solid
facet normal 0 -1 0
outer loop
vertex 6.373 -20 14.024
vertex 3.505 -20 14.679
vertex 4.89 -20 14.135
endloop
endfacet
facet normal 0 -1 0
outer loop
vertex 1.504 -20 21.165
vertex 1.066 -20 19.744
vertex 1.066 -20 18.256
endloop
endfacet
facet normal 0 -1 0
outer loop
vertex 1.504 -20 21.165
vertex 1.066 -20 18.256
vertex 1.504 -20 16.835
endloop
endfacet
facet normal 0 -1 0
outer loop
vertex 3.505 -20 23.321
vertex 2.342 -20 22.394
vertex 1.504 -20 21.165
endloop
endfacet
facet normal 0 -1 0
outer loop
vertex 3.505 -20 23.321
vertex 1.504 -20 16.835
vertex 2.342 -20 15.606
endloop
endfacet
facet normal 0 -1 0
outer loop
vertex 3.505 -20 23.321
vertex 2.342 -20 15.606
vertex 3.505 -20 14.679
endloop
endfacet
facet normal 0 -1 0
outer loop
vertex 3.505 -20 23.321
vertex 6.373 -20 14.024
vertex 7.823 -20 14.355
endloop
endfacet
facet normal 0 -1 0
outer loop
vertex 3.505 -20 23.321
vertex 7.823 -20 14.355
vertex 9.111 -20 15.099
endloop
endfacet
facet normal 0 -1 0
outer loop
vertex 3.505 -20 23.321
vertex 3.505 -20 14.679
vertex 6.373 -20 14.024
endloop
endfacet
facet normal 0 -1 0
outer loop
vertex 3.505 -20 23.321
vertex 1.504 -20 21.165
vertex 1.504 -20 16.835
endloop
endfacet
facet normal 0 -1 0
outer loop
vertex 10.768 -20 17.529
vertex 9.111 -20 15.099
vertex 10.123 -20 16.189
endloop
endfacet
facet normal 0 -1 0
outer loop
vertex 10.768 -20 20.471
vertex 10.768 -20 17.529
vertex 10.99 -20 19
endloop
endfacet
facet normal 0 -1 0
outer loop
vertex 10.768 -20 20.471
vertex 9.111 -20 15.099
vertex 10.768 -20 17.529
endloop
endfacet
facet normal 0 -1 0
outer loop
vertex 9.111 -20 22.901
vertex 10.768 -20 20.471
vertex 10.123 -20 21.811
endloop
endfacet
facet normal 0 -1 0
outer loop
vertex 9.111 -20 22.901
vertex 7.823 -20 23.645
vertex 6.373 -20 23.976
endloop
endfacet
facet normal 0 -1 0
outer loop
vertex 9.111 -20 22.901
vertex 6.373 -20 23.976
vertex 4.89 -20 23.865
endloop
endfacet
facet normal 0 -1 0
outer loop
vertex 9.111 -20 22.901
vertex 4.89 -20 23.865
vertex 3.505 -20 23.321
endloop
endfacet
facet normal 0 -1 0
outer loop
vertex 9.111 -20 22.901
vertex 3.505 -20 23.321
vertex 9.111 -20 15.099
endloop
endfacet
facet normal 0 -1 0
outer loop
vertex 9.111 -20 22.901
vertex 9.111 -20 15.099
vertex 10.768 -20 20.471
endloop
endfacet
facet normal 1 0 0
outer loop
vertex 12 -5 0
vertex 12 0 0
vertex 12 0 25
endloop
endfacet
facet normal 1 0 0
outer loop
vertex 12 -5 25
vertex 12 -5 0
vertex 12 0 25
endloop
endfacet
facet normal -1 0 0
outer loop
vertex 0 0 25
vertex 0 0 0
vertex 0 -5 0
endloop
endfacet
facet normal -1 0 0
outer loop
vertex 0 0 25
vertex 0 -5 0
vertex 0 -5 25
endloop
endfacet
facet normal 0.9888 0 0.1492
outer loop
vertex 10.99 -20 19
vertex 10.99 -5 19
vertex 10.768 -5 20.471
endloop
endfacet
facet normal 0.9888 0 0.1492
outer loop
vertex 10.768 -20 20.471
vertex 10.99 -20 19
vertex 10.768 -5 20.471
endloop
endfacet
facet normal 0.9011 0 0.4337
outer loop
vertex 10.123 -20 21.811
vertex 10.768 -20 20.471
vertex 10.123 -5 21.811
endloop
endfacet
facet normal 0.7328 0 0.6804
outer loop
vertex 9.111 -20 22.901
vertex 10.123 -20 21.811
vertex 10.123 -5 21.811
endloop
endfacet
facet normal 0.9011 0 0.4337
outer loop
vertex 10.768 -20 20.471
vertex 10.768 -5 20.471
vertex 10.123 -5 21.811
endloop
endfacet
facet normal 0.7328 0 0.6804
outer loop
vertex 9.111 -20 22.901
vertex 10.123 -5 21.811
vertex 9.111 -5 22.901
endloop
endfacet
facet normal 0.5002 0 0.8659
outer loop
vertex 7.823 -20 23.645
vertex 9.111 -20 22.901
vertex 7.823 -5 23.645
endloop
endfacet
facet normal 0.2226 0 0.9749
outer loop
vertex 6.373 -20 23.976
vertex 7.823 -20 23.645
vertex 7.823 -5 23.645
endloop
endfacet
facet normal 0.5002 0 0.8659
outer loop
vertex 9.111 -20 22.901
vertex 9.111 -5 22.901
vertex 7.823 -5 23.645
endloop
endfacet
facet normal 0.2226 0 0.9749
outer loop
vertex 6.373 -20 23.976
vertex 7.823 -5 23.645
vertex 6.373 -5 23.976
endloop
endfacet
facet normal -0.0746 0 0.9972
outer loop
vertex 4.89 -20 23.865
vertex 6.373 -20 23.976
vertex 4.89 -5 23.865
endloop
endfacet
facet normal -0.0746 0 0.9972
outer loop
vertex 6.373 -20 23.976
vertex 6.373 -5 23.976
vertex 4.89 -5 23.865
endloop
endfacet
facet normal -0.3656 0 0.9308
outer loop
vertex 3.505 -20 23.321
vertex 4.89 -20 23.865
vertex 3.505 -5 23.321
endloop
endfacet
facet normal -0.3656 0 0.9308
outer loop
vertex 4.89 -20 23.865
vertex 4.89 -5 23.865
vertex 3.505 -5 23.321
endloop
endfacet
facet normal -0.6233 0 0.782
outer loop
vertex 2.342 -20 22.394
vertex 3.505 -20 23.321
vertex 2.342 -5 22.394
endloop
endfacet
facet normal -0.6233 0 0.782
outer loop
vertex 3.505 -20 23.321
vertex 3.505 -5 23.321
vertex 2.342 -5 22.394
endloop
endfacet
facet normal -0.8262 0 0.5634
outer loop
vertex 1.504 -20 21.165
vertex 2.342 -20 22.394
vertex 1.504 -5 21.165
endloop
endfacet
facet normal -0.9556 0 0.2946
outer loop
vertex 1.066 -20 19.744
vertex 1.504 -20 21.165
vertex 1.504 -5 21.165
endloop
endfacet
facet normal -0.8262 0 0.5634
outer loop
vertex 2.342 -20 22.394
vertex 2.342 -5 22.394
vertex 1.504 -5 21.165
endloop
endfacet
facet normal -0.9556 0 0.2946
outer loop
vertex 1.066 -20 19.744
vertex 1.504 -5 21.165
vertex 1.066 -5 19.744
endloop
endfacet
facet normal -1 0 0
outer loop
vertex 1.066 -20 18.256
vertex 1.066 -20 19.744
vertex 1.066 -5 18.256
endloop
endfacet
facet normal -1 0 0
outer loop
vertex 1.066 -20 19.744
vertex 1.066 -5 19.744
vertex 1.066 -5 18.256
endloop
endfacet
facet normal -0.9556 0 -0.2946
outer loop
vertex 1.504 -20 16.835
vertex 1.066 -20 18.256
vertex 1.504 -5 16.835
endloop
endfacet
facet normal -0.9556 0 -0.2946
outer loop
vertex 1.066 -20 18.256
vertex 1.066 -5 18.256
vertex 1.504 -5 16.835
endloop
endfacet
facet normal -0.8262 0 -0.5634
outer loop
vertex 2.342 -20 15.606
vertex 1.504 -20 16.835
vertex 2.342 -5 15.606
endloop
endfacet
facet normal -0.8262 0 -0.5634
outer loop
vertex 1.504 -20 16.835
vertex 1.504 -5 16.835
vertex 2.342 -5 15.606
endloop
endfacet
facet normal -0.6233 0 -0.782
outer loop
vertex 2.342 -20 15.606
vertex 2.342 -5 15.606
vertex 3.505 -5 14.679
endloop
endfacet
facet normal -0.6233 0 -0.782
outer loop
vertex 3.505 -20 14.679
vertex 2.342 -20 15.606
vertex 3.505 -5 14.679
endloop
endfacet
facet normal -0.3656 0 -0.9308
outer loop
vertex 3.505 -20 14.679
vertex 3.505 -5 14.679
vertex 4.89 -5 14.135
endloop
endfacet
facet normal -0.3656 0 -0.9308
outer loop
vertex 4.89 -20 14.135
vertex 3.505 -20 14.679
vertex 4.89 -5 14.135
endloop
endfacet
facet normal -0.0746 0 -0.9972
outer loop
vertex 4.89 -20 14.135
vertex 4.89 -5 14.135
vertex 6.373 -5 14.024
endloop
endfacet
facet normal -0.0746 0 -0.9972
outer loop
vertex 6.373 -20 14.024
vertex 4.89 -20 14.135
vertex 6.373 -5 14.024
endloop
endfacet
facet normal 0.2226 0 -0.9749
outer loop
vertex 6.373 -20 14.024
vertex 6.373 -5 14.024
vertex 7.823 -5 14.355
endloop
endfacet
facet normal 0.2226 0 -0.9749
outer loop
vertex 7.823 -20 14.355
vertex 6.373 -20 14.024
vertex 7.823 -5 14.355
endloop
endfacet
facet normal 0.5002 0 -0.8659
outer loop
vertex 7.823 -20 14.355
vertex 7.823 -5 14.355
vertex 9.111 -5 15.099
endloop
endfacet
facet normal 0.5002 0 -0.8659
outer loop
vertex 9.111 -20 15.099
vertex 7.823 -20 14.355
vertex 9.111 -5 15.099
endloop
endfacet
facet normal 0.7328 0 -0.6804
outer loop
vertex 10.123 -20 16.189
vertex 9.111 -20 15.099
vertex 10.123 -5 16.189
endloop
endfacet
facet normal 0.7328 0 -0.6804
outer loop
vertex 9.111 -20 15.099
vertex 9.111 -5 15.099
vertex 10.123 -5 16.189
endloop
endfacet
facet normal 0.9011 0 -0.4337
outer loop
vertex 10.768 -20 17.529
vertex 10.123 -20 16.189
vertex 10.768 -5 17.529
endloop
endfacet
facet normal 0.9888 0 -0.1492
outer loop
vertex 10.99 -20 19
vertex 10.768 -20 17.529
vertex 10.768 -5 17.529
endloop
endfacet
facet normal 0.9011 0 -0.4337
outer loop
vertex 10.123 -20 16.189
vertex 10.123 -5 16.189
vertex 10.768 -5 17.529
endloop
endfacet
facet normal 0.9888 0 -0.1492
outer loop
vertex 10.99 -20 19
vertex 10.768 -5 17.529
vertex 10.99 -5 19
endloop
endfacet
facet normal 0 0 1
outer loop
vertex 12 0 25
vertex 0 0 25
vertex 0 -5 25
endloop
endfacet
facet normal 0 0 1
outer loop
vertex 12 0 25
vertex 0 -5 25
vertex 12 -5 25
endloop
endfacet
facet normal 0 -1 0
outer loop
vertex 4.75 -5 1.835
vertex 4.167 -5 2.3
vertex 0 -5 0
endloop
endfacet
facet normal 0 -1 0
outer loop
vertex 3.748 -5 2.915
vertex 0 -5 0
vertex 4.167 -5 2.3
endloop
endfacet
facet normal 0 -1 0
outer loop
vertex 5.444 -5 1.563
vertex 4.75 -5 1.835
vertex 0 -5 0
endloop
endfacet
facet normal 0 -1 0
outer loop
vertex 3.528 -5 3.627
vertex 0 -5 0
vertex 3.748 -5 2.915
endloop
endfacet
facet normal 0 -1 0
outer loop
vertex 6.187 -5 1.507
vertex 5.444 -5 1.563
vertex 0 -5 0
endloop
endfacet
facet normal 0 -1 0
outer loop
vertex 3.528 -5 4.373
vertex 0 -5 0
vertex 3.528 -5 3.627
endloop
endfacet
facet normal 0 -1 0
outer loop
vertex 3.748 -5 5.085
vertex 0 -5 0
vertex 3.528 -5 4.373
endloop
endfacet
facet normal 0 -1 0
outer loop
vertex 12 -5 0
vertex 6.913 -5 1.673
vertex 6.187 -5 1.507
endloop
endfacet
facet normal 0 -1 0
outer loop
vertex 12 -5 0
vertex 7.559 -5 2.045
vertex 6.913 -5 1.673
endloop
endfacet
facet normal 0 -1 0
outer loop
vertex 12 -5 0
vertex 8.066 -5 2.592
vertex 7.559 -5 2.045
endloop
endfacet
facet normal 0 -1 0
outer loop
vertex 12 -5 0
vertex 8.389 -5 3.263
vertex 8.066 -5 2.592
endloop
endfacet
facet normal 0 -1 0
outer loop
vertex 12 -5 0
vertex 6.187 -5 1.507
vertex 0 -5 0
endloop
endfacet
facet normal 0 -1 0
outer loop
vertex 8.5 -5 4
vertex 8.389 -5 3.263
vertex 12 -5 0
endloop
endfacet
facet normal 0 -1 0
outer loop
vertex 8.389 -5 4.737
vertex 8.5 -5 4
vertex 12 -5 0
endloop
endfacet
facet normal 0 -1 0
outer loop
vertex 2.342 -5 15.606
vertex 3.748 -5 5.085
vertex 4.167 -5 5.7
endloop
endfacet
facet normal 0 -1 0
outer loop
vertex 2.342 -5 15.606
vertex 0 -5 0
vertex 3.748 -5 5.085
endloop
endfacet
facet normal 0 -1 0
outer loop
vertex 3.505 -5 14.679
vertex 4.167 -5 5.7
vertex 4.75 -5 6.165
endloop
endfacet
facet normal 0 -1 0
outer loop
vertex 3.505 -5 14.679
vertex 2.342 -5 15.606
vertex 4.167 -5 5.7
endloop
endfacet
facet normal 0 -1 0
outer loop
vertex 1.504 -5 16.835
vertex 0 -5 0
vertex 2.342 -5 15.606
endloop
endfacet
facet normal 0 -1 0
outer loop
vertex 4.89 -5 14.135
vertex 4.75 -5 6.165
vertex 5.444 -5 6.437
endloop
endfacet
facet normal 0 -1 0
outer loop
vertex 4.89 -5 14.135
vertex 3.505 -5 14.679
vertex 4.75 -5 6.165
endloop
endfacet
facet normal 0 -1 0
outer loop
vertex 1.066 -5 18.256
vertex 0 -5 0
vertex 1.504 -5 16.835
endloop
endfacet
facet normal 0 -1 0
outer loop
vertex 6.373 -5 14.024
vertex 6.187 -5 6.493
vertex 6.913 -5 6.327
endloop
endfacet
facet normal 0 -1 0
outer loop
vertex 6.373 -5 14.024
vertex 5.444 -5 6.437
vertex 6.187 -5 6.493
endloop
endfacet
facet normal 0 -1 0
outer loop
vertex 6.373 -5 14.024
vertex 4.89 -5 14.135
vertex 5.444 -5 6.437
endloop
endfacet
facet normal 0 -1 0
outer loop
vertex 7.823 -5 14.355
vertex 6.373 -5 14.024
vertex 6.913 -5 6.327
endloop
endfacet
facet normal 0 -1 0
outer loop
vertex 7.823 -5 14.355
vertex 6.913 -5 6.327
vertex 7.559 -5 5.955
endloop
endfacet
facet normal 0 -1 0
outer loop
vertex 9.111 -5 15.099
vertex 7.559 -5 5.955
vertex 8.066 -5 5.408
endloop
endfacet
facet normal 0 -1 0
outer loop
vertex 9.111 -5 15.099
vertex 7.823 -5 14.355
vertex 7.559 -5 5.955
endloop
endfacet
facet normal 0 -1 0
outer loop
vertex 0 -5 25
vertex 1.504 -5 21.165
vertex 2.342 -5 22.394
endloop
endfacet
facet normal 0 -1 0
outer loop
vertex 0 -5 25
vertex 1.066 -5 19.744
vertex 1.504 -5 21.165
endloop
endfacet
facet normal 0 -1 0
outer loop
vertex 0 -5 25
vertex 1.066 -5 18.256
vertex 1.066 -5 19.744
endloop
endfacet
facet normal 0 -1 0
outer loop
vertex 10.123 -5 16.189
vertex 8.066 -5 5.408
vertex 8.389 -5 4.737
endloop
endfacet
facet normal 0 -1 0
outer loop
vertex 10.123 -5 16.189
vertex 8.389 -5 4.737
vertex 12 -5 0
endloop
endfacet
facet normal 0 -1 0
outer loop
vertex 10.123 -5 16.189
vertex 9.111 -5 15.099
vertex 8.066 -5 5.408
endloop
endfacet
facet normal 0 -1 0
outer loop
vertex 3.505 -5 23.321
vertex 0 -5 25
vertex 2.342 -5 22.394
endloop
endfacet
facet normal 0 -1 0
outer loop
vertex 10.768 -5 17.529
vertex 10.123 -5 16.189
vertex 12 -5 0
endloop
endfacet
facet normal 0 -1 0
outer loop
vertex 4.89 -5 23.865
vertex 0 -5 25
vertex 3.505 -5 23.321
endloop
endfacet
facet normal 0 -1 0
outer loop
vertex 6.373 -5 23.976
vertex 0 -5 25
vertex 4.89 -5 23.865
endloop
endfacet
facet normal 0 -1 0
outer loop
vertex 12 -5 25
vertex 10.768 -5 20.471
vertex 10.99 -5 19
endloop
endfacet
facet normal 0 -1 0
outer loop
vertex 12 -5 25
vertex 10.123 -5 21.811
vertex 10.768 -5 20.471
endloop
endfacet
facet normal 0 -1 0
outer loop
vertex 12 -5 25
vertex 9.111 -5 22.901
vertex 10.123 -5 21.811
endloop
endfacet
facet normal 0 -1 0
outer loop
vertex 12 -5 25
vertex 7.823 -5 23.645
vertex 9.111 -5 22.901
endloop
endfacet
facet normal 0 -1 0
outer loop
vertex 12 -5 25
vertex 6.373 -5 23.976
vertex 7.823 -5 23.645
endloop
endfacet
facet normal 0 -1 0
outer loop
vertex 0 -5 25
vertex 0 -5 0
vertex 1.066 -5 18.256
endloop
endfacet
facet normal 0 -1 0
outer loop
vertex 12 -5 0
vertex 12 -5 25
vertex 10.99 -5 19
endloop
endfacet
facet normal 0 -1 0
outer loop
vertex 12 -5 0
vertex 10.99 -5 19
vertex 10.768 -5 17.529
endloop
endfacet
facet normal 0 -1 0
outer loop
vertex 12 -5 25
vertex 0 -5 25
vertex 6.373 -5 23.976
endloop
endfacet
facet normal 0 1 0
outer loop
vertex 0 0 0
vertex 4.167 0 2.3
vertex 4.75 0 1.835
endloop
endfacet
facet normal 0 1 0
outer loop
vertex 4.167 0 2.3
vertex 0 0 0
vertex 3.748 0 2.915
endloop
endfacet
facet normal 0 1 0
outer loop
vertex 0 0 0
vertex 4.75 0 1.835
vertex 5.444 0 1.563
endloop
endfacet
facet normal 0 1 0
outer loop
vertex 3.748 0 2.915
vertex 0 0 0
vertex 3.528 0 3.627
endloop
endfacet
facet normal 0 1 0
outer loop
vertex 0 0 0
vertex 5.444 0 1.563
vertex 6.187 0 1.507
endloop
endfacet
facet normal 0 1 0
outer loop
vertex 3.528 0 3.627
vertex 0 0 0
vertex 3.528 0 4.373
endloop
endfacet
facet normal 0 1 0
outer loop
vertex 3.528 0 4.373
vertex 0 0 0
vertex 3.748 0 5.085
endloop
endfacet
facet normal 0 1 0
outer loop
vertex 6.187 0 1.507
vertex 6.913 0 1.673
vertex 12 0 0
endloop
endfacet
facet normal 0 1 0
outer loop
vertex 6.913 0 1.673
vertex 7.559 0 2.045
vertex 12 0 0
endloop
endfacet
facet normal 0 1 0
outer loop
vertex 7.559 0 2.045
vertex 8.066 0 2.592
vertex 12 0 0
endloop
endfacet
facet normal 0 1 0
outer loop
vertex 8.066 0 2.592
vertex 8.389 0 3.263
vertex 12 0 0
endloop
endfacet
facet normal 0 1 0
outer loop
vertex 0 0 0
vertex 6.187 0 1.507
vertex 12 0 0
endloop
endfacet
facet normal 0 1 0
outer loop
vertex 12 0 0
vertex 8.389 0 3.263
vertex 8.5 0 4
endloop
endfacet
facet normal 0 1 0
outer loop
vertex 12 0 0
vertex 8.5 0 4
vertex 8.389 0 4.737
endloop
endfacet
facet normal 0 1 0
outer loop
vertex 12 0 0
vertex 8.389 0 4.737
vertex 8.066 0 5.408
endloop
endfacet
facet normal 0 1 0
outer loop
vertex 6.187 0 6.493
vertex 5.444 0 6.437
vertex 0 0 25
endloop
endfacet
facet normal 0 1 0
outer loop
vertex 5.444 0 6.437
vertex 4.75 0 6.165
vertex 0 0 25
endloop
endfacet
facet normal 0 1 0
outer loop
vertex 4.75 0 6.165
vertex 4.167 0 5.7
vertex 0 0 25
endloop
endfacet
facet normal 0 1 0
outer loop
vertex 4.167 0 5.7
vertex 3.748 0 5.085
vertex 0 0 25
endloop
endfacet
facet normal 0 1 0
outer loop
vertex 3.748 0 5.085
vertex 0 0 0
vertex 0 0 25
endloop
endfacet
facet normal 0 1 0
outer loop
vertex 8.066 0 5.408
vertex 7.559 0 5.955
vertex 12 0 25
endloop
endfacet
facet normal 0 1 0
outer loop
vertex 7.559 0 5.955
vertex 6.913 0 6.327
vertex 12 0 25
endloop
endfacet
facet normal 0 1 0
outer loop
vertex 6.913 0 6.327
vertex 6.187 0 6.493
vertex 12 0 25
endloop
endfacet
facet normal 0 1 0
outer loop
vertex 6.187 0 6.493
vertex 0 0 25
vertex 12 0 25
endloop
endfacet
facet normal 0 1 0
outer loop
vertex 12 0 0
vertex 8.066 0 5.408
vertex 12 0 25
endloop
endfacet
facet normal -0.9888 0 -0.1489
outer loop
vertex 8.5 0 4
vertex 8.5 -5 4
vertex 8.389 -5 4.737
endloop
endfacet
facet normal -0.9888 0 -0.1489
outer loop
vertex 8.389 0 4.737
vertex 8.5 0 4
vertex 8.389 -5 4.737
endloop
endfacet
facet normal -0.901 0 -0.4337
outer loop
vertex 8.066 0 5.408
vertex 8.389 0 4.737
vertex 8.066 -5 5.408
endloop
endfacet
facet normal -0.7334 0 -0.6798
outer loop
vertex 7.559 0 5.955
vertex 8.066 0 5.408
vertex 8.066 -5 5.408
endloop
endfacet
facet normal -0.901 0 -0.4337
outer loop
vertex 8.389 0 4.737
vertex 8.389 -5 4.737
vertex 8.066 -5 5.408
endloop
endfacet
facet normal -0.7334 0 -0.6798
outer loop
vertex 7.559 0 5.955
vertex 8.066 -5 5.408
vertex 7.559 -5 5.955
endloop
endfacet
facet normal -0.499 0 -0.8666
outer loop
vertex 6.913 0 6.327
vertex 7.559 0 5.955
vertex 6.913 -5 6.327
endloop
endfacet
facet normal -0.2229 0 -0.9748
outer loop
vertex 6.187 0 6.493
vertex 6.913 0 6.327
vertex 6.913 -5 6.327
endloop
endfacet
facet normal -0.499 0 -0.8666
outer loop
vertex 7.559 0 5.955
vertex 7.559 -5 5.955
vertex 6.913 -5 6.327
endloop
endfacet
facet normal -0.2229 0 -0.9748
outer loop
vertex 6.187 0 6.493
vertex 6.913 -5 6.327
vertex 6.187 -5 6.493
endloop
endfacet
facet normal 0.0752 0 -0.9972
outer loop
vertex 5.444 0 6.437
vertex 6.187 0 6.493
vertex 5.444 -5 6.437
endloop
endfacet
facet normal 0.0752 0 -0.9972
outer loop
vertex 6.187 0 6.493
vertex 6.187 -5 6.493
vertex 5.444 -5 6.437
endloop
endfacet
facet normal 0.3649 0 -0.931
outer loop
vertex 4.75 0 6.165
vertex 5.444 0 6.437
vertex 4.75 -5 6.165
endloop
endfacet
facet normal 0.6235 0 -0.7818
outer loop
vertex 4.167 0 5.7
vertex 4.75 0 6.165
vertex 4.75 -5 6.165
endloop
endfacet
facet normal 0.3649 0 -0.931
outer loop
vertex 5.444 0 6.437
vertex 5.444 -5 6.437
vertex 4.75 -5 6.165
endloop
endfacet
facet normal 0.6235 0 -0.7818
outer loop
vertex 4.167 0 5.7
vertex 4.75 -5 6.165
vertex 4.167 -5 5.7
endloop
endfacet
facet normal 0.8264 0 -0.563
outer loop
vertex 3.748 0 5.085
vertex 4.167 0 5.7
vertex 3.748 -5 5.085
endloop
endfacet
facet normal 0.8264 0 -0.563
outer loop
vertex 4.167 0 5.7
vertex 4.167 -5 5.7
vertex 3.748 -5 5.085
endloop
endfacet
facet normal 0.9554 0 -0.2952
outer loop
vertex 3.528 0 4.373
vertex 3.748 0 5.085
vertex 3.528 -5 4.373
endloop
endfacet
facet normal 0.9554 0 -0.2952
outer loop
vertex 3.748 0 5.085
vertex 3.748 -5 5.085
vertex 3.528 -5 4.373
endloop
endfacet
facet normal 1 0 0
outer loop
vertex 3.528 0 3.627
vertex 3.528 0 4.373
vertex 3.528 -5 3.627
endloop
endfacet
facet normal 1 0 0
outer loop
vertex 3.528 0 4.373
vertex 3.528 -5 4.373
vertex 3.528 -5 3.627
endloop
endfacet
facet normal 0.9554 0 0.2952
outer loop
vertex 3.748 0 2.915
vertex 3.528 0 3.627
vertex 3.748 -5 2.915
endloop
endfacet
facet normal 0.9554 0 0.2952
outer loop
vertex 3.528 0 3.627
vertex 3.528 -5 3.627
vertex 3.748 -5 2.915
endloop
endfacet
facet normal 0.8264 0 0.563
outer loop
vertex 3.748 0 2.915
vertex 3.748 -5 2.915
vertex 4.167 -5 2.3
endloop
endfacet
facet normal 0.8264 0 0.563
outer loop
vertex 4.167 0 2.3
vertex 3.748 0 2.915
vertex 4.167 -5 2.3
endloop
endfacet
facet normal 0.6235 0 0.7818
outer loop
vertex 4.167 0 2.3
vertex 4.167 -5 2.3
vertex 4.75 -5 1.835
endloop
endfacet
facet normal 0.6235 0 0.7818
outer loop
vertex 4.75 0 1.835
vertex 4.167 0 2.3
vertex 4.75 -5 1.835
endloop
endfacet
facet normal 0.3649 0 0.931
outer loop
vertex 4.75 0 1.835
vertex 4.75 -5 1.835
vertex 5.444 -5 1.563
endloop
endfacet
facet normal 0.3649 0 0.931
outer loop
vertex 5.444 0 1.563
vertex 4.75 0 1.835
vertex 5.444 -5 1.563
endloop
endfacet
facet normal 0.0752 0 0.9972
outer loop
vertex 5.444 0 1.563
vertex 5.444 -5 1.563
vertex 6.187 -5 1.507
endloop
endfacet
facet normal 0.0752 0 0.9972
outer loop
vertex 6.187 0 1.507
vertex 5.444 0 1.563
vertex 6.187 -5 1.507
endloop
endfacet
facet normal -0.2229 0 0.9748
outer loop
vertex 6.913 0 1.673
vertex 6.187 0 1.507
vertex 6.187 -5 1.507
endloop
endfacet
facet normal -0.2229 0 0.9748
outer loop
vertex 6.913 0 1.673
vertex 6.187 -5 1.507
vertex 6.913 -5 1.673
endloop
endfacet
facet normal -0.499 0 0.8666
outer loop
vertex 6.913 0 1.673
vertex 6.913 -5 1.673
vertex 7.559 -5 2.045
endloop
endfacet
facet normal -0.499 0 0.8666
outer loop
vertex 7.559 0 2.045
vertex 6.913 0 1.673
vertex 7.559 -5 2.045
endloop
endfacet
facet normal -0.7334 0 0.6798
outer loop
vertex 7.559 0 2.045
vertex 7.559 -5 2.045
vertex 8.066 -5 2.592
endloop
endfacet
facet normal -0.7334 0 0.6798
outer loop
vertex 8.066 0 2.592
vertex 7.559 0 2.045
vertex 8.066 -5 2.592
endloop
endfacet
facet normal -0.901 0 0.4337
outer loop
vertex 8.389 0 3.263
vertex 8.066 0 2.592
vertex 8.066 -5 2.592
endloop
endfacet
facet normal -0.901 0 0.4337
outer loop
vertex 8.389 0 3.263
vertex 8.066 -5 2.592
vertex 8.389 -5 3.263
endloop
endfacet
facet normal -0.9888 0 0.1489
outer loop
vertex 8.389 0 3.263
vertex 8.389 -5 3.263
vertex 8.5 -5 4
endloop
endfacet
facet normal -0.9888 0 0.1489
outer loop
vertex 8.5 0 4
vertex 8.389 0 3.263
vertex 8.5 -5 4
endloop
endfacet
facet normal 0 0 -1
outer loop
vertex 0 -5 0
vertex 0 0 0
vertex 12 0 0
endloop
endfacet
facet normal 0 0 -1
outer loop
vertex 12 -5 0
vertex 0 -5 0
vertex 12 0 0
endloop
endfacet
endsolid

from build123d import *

# Parameters (mm, degrees)
F0_W     = 12
F0_H     = 25
F1_DEPTH = 5
F2_R     = 2.5
F3_DEPTH = 5.001
F4_R     = 4.99
F5_DEPTH = 15


with BuildPart() as f1:
    # F0 (on Front) → F1 (new body)
    with BuildSketch(Plane.XZ):
        with Locations((6, 12.5)):
            Rectangle(F0_W, F0_H)
    extrude(amount=F1_DEPTH)

    # F2 (on face) → F3 (cut, through all)
    with BuildSketch(Plane.XZ.offset(5)):
        with Locations((6, 4)):
            Circle(F2_R)
    extrude(amount=-F3_DEPTH, mode=Mode.SUBTRACT)

    # F4 (on face) → F5 (join)
    with BuildSketch(Plane.XZ.offset(5)):
        with Locations((6, 19)):
            Circle(F4_R)
    extrude(amount=F5_DEPTH)


solid = f1.part
